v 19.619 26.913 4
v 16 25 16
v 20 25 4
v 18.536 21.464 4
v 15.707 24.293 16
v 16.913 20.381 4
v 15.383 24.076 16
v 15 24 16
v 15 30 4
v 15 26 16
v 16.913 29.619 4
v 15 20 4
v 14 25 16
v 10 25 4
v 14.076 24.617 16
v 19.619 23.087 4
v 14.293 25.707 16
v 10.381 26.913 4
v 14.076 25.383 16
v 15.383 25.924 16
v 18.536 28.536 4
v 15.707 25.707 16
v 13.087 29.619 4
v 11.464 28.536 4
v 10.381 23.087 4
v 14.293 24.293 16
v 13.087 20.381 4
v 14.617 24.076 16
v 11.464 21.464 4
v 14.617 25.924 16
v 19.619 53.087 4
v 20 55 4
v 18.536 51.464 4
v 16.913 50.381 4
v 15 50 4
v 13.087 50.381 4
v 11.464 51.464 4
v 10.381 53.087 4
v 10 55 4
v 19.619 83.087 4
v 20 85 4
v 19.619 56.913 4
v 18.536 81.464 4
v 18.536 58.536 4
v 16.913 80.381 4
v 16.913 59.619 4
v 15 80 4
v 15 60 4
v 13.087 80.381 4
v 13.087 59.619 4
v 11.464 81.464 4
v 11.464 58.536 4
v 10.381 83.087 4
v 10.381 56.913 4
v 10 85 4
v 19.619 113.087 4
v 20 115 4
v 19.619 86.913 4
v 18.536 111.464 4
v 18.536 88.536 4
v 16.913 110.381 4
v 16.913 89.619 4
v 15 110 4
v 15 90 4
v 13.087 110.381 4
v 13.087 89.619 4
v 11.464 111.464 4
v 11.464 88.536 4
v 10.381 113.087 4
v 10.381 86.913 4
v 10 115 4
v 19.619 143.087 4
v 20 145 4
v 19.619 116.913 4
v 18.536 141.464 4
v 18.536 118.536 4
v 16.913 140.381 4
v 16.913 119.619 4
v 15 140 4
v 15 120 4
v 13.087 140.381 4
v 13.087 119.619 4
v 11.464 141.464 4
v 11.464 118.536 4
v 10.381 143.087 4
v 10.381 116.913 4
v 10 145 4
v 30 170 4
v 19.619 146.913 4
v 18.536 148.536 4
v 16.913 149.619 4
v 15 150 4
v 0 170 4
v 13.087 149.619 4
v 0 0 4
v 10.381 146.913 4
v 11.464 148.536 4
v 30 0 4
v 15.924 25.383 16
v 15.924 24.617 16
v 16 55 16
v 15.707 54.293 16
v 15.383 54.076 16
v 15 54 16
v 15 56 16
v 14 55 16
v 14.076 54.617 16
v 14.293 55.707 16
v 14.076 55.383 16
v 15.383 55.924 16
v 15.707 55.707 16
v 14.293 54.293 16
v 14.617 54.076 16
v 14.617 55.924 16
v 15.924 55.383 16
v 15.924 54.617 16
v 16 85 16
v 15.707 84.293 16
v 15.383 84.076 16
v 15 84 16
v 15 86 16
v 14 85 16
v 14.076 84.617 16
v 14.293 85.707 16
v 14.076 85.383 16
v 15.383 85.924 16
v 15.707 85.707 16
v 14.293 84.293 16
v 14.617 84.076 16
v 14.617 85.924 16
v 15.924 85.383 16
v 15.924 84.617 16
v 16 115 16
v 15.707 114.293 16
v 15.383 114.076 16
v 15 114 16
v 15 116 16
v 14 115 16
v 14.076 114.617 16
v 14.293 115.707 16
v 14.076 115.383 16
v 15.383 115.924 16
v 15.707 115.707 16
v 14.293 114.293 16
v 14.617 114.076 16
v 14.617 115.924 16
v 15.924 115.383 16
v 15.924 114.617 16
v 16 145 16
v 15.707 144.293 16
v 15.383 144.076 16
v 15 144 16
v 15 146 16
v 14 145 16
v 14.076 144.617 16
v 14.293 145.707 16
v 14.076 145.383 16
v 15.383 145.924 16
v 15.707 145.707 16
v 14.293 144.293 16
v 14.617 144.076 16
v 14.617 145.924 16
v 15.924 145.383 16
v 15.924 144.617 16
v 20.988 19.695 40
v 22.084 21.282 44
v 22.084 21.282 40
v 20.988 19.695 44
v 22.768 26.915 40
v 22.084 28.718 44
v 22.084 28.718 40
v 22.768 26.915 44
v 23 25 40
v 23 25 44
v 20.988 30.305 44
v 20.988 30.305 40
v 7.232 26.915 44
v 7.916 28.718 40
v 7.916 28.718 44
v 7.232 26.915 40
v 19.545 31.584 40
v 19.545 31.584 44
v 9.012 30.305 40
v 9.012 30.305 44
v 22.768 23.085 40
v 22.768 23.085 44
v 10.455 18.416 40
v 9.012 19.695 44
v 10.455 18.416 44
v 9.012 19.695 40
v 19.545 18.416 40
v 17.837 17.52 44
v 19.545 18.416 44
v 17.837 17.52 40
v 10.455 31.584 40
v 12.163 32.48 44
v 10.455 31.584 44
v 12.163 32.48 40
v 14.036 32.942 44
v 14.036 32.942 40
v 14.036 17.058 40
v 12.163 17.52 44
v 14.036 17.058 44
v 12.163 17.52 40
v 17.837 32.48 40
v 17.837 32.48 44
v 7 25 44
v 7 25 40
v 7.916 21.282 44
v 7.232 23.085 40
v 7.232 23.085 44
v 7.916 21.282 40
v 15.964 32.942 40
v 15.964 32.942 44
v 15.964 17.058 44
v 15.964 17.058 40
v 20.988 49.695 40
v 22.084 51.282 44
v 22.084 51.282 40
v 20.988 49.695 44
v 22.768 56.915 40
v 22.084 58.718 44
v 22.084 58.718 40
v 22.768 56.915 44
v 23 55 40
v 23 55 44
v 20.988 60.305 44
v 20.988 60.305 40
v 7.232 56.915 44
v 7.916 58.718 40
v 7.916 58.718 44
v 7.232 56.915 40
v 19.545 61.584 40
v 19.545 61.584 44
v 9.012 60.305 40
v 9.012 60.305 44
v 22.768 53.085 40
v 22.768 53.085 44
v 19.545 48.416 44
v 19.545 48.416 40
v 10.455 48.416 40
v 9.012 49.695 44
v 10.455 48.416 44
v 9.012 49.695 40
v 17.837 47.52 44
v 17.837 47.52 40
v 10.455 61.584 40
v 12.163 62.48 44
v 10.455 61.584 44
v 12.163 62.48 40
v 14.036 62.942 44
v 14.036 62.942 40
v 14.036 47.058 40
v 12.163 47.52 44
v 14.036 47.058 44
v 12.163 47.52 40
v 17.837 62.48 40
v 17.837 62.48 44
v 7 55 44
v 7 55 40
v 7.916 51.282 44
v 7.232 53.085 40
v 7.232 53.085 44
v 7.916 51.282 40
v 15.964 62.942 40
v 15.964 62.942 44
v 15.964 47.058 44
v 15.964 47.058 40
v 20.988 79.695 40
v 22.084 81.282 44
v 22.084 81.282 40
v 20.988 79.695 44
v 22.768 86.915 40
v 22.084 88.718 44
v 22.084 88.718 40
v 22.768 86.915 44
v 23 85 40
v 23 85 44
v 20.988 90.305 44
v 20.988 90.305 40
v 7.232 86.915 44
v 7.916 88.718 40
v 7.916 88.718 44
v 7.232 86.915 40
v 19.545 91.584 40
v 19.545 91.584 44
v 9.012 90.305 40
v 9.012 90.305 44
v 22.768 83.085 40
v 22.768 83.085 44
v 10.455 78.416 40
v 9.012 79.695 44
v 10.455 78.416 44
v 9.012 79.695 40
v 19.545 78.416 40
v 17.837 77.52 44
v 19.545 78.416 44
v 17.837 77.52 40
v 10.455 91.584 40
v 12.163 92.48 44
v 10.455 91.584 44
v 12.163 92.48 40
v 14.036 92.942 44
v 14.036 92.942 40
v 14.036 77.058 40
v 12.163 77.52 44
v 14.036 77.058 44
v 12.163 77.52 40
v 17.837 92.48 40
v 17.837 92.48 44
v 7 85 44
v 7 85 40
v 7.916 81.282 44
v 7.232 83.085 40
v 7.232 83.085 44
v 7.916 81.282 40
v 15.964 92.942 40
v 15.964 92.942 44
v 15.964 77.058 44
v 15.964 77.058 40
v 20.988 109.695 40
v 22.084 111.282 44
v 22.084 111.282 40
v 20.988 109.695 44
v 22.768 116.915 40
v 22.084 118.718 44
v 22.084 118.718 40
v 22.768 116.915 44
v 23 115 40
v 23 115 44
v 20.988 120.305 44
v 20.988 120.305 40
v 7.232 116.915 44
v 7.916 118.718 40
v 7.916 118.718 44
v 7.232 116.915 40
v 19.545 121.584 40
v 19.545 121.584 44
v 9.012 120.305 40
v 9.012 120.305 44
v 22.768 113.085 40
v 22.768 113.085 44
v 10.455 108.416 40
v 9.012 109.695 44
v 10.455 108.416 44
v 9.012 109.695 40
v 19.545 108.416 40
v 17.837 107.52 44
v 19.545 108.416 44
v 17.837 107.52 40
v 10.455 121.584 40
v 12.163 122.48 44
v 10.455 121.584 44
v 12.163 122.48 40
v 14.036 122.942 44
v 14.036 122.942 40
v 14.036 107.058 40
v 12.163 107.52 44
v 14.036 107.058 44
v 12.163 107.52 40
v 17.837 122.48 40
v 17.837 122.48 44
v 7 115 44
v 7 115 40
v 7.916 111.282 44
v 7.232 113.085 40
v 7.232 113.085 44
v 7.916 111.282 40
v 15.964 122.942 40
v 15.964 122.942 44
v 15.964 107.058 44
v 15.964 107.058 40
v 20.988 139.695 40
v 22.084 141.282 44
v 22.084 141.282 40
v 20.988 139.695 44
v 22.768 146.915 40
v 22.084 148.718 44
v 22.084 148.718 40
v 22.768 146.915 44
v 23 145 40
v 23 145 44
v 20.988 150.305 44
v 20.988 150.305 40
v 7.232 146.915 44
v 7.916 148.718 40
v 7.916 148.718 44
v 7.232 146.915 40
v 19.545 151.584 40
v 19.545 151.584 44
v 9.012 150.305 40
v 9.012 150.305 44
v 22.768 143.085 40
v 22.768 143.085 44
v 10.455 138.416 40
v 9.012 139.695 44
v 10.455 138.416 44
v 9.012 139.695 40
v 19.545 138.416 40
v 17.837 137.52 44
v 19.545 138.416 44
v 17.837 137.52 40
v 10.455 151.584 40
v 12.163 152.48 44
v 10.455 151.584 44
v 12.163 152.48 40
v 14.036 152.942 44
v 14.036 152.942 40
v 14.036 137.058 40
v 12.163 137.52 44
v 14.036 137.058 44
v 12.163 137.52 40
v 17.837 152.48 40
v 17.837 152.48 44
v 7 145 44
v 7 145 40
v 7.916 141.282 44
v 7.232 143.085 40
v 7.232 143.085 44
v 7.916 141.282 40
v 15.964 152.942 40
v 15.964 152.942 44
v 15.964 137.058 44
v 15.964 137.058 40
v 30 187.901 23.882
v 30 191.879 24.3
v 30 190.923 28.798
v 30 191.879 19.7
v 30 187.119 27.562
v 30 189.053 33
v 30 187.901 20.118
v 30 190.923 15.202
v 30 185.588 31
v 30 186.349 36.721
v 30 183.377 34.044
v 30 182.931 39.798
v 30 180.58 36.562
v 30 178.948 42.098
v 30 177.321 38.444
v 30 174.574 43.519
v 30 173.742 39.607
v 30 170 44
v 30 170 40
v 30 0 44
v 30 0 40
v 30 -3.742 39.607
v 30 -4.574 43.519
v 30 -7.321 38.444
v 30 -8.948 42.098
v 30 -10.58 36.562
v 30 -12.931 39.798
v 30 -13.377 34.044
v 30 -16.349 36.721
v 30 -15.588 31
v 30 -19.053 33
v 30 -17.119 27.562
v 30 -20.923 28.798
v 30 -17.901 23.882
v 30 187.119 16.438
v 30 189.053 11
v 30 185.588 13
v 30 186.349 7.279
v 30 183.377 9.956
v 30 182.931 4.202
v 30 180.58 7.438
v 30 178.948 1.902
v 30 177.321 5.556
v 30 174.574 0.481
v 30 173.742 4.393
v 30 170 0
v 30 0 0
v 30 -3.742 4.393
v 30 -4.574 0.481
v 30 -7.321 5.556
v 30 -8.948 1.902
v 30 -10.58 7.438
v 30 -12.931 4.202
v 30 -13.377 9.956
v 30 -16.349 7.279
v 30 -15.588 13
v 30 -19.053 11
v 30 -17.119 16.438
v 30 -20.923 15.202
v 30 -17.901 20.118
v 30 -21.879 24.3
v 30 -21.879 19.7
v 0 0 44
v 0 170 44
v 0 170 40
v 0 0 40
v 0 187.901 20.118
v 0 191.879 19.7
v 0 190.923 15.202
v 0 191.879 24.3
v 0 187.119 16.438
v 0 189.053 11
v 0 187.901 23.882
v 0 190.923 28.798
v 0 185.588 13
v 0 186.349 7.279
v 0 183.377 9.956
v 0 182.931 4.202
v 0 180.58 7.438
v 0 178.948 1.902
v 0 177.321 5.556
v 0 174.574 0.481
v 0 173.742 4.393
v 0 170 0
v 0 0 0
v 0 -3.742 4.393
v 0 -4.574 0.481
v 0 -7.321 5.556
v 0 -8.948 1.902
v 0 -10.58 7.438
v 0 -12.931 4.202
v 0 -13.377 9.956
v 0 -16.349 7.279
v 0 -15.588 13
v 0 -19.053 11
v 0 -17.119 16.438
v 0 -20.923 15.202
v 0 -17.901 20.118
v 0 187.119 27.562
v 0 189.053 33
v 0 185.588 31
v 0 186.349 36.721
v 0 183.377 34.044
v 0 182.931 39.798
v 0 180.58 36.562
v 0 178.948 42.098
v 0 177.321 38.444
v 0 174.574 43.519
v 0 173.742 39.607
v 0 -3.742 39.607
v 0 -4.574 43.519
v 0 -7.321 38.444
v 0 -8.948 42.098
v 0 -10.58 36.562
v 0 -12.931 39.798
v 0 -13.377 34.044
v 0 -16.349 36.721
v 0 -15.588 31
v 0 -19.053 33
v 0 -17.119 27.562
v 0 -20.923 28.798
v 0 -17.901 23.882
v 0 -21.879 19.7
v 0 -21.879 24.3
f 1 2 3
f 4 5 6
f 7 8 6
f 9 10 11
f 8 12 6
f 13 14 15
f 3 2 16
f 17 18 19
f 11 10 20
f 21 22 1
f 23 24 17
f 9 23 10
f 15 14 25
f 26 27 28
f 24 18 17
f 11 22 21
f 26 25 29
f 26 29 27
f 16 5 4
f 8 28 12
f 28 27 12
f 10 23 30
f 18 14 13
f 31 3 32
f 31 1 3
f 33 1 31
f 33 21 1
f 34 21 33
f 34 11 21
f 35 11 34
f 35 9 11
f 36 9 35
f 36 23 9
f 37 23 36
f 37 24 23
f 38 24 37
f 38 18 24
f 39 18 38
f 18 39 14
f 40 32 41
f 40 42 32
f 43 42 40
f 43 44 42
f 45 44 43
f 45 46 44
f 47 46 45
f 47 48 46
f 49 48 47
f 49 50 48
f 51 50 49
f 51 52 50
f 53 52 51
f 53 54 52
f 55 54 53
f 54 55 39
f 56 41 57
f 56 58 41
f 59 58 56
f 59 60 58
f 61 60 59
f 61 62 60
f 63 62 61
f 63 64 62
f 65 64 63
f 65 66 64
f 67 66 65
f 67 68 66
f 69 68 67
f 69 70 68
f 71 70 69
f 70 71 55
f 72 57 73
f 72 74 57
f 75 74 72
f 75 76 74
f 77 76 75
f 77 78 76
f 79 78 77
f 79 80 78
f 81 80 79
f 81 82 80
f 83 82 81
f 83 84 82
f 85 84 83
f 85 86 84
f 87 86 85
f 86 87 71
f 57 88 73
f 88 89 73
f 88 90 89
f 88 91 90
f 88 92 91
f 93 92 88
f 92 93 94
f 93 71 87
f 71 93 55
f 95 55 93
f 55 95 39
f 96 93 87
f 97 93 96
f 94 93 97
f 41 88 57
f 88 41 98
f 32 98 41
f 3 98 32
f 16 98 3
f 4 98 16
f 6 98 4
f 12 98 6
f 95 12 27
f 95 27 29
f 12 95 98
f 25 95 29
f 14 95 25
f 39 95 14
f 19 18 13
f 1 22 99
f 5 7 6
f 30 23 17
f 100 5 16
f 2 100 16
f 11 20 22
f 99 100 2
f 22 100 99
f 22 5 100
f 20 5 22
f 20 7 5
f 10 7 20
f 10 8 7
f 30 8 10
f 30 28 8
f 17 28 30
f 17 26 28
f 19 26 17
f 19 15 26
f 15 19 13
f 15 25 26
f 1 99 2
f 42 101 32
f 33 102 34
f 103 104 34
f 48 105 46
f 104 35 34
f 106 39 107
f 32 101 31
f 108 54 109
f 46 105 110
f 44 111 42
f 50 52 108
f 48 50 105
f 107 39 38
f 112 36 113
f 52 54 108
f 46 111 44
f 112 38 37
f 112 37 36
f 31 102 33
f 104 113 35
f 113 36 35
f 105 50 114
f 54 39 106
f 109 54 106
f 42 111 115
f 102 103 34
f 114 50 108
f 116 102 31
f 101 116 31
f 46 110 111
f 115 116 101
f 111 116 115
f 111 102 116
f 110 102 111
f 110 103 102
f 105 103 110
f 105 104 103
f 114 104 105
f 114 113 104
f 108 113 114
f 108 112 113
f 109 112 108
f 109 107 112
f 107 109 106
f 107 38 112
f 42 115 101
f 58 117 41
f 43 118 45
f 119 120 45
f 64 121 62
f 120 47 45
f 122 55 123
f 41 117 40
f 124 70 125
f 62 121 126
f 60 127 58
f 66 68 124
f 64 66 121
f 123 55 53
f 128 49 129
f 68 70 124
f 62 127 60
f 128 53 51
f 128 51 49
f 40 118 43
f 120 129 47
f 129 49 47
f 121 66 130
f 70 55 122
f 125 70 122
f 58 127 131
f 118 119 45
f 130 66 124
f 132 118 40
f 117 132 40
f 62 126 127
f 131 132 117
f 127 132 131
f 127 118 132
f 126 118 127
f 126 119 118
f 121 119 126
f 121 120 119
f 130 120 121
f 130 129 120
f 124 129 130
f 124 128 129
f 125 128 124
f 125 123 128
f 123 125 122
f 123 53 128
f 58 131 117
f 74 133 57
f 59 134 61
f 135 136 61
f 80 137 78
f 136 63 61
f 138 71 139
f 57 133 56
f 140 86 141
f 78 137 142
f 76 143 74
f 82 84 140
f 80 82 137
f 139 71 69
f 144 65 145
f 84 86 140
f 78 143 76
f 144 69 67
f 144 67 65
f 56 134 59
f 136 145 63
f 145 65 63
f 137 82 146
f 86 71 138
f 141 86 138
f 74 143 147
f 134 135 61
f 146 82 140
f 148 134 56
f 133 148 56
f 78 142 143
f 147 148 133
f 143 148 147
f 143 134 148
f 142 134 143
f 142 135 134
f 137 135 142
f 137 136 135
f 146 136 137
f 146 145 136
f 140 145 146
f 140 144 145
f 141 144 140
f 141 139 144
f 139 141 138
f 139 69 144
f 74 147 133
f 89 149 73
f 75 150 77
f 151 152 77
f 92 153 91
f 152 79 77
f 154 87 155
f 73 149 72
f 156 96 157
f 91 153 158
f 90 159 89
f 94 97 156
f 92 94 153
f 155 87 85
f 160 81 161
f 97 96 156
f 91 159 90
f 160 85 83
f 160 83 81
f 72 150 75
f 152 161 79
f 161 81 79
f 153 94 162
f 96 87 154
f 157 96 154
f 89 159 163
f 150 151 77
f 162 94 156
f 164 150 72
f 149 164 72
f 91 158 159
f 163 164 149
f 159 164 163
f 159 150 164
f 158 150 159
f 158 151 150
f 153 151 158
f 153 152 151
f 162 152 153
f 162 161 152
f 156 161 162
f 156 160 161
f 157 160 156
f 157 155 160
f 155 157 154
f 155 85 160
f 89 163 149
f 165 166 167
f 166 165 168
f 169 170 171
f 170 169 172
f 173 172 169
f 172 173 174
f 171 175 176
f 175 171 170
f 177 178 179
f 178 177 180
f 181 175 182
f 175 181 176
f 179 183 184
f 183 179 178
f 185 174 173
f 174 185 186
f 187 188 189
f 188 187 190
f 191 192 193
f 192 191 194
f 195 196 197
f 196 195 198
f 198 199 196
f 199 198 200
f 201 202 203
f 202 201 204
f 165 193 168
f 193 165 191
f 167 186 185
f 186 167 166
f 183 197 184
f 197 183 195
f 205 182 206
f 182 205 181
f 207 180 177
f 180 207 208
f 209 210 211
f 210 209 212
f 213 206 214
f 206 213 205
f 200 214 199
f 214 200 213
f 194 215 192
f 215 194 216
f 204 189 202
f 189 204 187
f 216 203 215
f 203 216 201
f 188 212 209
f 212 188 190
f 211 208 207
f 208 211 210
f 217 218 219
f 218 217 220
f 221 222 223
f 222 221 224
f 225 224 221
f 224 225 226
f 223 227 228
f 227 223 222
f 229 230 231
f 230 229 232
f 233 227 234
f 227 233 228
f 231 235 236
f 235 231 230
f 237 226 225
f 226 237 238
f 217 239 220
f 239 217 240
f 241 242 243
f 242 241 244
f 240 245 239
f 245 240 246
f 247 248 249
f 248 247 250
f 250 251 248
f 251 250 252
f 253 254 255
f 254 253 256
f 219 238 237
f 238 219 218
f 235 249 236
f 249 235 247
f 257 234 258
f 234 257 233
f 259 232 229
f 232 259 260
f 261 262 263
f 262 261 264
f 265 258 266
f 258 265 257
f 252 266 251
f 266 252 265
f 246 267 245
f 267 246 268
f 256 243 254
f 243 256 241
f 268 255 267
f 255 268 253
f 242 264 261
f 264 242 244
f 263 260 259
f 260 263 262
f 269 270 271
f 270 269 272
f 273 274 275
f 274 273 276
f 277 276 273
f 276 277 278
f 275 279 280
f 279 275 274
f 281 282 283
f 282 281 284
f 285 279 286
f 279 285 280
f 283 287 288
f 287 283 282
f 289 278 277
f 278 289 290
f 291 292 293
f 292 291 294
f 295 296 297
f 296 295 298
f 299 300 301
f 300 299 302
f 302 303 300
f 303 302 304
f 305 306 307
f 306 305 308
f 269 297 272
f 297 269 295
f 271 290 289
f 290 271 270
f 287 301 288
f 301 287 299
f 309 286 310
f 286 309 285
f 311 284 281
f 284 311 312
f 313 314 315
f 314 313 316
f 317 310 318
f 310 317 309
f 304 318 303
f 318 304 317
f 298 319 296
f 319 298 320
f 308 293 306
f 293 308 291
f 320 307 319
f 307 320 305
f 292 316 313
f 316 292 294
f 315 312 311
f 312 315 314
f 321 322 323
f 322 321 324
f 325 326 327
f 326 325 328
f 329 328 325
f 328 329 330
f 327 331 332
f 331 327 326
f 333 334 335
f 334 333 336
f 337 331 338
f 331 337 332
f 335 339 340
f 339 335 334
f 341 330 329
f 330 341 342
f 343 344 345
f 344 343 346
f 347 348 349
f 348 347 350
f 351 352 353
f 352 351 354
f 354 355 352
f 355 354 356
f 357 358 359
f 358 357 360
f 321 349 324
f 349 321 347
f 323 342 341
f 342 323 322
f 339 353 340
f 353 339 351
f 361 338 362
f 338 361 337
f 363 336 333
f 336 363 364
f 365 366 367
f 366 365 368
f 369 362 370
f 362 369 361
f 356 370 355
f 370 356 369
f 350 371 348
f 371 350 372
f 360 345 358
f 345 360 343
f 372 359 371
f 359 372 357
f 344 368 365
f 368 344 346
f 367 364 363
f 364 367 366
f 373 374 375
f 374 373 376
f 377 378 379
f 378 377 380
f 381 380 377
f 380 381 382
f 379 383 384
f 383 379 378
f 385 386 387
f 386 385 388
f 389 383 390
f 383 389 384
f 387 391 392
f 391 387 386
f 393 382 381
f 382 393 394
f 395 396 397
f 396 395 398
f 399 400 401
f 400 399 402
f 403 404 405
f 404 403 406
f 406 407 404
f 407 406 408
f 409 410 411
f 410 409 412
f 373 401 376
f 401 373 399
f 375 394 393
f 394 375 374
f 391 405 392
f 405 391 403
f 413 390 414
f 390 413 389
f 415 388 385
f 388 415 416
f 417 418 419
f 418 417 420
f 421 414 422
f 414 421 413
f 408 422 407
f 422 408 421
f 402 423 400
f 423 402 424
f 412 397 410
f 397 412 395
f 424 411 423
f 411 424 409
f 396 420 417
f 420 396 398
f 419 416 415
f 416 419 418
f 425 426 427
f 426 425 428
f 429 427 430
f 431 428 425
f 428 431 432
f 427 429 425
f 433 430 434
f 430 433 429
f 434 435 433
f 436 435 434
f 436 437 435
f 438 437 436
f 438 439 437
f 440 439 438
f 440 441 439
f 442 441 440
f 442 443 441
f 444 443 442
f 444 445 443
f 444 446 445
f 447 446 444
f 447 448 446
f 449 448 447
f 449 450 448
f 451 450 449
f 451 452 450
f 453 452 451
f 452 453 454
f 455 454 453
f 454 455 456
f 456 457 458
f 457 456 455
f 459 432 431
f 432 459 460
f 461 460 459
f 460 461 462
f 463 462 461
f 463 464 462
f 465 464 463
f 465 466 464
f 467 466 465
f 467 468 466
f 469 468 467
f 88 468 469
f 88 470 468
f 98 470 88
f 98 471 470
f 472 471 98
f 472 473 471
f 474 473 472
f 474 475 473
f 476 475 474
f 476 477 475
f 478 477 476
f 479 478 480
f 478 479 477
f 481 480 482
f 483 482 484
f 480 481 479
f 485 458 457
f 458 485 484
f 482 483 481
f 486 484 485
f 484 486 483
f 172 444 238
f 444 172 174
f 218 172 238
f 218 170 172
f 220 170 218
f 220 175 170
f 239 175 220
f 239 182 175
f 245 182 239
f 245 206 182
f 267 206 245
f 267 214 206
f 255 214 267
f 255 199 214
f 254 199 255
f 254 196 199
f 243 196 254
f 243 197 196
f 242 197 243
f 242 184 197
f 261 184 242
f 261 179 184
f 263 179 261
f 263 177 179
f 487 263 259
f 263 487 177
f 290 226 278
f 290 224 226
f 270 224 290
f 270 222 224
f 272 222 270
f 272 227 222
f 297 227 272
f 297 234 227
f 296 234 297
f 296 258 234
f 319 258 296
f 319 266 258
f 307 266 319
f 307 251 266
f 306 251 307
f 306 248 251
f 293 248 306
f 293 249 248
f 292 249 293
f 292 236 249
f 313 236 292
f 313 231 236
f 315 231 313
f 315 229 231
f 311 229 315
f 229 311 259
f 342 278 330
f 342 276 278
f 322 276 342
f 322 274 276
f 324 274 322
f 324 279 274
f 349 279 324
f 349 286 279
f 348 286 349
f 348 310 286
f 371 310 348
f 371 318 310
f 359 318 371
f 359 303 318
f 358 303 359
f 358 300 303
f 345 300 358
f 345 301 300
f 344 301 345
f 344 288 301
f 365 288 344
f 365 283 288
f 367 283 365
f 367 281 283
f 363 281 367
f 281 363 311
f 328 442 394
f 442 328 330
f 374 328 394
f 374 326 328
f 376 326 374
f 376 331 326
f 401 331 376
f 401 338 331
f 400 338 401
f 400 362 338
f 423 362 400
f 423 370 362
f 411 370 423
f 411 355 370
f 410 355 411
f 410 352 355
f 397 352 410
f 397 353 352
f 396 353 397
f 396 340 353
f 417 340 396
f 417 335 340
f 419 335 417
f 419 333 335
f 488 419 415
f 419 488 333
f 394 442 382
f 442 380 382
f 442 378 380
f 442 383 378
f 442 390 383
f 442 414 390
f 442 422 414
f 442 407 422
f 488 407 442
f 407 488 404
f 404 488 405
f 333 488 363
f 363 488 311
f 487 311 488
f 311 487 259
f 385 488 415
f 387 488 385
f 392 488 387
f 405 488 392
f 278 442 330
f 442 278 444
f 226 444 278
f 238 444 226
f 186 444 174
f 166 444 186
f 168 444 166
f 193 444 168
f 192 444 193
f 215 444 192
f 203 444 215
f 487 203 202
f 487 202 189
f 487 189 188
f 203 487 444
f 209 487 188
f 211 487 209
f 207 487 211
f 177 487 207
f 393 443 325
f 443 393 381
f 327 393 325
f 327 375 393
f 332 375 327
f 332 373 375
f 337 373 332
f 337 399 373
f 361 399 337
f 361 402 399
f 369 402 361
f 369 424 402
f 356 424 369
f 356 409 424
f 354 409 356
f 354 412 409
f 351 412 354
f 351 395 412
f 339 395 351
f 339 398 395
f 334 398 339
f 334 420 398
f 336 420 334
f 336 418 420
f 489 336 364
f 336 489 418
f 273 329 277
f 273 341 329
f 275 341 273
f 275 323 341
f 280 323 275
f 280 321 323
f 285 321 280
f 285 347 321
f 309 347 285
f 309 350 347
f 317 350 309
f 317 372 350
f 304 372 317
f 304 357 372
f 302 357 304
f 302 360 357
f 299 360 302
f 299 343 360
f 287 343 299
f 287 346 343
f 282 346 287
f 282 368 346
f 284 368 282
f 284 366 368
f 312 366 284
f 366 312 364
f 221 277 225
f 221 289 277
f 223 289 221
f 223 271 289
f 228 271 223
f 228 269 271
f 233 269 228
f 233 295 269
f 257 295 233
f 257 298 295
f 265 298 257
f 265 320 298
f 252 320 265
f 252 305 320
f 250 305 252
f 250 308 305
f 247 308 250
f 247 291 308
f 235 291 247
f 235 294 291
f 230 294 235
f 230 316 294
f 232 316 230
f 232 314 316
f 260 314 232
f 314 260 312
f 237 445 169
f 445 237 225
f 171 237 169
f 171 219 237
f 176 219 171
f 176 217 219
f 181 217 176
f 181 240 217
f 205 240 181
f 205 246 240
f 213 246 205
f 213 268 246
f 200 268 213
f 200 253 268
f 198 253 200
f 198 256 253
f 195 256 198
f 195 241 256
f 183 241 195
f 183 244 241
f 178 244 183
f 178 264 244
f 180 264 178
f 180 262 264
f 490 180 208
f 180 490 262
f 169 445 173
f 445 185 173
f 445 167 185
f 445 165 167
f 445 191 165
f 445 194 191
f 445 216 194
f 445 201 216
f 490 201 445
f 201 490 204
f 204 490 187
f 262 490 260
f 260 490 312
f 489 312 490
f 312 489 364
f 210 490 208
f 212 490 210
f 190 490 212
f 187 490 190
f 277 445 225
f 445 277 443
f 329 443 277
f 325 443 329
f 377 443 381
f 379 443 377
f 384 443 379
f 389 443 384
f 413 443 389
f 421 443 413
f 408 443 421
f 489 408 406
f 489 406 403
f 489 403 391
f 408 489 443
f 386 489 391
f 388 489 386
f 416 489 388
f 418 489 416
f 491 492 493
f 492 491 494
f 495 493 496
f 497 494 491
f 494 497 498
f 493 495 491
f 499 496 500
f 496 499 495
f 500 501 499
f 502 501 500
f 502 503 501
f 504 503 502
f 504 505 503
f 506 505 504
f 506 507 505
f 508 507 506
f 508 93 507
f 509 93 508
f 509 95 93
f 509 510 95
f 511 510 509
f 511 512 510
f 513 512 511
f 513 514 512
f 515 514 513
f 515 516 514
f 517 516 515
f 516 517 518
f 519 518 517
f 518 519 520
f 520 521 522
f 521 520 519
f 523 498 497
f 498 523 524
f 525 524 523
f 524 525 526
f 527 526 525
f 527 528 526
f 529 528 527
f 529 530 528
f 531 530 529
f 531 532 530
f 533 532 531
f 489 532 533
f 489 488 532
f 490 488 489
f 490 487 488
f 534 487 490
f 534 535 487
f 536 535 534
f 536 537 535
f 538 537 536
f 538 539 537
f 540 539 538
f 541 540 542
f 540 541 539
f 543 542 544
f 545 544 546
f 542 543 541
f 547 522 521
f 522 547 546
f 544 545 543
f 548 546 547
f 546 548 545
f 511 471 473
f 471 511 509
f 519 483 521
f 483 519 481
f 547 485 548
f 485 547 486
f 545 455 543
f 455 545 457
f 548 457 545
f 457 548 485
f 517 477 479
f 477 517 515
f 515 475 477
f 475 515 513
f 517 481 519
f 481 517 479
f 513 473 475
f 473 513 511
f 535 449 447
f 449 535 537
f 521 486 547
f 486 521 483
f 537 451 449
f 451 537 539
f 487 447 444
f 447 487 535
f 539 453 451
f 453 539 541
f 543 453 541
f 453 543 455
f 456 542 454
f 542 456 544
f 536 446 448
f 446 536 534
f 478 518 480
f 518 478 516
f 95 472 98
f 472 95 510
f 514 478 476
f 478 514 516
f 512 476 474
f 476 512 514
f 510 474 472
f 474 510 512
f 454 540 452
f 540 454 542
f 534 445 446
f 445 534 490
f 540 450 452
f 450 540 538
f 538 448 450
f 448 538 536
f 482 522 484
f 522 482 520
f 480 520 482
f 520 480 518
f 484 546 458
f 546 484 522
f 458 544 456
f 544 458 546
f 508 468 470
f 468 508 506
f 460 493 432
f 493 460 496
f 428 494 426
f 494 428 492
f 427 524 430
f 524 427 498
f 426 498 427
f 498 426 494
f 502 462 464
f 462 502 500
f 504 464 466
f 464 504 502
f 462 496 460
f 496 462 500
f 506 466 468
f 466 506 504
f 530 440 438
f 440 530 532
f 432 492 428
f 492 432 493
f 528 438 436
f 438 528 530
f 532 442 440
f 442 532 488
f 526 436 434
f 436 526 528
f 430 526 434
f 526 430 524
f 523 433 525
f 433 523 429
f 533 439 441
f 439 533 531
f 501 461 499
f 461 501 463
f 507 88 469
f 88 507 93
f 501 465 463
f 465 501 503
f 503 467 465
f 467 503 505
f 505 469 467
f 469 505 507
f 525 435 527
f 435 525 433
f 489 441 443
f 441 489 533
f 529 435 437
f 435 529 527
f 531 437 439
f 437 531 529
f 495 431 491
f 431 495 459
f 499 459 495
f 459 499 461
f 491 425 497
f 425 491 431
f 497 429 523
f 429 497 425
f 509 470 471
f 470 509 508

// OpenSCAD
/**
* Holder for Oral b Toothbrush
*/

border = 10;    // border on the left and right side
width = 30;     // width of the object
height = 40;    // height of the object
holes = 5;      // how many holes
distance = 30;  // disctance between holes
thickness = 4;  // thickness of the layer

// Bottom
color("DeepPink")
  translate([0, 0, 0])
    cube([width, 2*border + holes*distance, thickness]);
    
// Bolt
color("Blue") {
  for (i = [1:holes]) {
    translate([width/2, distance*(i-1) + distance/2 + border, thickness])
      cylinder(12,5,1);    
  }
}

// Top with holes
color("DeepPink")
  translate([0, 0, height])
    difference() {
      cube([width, border*2 + holes*distance, thickness]);
      
      for (i = [1:holes]) {
        translate([width/2, distance*(i-1) + distance/2 + border,-1])
          cylinder(6,8,8);   
      }
    }

// left side
color("DarkGreen")
  drawSide();

// right side
color("DarkGreen")
  mirror([0,1,0])
    translate([0, (2*border + holes*distance)*-1, 0])
      drawSide();
         
module drawSide() {
  rotate([90,90,90])
    translate([-1*(height+thickness)/2, 0, 0])
      difference() {
        cylinder(width, (height+thickness)/2, (height+thickness)/2);
        translate([0, 0, -1])
          cylinder(width+2, (height-thickness)/2, (height-thickness)/2);
        translate([-1*(height/2+2), 0, -1])
          cube([height+thickness, (height+thickness)/2, width+thickness/2]);
      }
}
